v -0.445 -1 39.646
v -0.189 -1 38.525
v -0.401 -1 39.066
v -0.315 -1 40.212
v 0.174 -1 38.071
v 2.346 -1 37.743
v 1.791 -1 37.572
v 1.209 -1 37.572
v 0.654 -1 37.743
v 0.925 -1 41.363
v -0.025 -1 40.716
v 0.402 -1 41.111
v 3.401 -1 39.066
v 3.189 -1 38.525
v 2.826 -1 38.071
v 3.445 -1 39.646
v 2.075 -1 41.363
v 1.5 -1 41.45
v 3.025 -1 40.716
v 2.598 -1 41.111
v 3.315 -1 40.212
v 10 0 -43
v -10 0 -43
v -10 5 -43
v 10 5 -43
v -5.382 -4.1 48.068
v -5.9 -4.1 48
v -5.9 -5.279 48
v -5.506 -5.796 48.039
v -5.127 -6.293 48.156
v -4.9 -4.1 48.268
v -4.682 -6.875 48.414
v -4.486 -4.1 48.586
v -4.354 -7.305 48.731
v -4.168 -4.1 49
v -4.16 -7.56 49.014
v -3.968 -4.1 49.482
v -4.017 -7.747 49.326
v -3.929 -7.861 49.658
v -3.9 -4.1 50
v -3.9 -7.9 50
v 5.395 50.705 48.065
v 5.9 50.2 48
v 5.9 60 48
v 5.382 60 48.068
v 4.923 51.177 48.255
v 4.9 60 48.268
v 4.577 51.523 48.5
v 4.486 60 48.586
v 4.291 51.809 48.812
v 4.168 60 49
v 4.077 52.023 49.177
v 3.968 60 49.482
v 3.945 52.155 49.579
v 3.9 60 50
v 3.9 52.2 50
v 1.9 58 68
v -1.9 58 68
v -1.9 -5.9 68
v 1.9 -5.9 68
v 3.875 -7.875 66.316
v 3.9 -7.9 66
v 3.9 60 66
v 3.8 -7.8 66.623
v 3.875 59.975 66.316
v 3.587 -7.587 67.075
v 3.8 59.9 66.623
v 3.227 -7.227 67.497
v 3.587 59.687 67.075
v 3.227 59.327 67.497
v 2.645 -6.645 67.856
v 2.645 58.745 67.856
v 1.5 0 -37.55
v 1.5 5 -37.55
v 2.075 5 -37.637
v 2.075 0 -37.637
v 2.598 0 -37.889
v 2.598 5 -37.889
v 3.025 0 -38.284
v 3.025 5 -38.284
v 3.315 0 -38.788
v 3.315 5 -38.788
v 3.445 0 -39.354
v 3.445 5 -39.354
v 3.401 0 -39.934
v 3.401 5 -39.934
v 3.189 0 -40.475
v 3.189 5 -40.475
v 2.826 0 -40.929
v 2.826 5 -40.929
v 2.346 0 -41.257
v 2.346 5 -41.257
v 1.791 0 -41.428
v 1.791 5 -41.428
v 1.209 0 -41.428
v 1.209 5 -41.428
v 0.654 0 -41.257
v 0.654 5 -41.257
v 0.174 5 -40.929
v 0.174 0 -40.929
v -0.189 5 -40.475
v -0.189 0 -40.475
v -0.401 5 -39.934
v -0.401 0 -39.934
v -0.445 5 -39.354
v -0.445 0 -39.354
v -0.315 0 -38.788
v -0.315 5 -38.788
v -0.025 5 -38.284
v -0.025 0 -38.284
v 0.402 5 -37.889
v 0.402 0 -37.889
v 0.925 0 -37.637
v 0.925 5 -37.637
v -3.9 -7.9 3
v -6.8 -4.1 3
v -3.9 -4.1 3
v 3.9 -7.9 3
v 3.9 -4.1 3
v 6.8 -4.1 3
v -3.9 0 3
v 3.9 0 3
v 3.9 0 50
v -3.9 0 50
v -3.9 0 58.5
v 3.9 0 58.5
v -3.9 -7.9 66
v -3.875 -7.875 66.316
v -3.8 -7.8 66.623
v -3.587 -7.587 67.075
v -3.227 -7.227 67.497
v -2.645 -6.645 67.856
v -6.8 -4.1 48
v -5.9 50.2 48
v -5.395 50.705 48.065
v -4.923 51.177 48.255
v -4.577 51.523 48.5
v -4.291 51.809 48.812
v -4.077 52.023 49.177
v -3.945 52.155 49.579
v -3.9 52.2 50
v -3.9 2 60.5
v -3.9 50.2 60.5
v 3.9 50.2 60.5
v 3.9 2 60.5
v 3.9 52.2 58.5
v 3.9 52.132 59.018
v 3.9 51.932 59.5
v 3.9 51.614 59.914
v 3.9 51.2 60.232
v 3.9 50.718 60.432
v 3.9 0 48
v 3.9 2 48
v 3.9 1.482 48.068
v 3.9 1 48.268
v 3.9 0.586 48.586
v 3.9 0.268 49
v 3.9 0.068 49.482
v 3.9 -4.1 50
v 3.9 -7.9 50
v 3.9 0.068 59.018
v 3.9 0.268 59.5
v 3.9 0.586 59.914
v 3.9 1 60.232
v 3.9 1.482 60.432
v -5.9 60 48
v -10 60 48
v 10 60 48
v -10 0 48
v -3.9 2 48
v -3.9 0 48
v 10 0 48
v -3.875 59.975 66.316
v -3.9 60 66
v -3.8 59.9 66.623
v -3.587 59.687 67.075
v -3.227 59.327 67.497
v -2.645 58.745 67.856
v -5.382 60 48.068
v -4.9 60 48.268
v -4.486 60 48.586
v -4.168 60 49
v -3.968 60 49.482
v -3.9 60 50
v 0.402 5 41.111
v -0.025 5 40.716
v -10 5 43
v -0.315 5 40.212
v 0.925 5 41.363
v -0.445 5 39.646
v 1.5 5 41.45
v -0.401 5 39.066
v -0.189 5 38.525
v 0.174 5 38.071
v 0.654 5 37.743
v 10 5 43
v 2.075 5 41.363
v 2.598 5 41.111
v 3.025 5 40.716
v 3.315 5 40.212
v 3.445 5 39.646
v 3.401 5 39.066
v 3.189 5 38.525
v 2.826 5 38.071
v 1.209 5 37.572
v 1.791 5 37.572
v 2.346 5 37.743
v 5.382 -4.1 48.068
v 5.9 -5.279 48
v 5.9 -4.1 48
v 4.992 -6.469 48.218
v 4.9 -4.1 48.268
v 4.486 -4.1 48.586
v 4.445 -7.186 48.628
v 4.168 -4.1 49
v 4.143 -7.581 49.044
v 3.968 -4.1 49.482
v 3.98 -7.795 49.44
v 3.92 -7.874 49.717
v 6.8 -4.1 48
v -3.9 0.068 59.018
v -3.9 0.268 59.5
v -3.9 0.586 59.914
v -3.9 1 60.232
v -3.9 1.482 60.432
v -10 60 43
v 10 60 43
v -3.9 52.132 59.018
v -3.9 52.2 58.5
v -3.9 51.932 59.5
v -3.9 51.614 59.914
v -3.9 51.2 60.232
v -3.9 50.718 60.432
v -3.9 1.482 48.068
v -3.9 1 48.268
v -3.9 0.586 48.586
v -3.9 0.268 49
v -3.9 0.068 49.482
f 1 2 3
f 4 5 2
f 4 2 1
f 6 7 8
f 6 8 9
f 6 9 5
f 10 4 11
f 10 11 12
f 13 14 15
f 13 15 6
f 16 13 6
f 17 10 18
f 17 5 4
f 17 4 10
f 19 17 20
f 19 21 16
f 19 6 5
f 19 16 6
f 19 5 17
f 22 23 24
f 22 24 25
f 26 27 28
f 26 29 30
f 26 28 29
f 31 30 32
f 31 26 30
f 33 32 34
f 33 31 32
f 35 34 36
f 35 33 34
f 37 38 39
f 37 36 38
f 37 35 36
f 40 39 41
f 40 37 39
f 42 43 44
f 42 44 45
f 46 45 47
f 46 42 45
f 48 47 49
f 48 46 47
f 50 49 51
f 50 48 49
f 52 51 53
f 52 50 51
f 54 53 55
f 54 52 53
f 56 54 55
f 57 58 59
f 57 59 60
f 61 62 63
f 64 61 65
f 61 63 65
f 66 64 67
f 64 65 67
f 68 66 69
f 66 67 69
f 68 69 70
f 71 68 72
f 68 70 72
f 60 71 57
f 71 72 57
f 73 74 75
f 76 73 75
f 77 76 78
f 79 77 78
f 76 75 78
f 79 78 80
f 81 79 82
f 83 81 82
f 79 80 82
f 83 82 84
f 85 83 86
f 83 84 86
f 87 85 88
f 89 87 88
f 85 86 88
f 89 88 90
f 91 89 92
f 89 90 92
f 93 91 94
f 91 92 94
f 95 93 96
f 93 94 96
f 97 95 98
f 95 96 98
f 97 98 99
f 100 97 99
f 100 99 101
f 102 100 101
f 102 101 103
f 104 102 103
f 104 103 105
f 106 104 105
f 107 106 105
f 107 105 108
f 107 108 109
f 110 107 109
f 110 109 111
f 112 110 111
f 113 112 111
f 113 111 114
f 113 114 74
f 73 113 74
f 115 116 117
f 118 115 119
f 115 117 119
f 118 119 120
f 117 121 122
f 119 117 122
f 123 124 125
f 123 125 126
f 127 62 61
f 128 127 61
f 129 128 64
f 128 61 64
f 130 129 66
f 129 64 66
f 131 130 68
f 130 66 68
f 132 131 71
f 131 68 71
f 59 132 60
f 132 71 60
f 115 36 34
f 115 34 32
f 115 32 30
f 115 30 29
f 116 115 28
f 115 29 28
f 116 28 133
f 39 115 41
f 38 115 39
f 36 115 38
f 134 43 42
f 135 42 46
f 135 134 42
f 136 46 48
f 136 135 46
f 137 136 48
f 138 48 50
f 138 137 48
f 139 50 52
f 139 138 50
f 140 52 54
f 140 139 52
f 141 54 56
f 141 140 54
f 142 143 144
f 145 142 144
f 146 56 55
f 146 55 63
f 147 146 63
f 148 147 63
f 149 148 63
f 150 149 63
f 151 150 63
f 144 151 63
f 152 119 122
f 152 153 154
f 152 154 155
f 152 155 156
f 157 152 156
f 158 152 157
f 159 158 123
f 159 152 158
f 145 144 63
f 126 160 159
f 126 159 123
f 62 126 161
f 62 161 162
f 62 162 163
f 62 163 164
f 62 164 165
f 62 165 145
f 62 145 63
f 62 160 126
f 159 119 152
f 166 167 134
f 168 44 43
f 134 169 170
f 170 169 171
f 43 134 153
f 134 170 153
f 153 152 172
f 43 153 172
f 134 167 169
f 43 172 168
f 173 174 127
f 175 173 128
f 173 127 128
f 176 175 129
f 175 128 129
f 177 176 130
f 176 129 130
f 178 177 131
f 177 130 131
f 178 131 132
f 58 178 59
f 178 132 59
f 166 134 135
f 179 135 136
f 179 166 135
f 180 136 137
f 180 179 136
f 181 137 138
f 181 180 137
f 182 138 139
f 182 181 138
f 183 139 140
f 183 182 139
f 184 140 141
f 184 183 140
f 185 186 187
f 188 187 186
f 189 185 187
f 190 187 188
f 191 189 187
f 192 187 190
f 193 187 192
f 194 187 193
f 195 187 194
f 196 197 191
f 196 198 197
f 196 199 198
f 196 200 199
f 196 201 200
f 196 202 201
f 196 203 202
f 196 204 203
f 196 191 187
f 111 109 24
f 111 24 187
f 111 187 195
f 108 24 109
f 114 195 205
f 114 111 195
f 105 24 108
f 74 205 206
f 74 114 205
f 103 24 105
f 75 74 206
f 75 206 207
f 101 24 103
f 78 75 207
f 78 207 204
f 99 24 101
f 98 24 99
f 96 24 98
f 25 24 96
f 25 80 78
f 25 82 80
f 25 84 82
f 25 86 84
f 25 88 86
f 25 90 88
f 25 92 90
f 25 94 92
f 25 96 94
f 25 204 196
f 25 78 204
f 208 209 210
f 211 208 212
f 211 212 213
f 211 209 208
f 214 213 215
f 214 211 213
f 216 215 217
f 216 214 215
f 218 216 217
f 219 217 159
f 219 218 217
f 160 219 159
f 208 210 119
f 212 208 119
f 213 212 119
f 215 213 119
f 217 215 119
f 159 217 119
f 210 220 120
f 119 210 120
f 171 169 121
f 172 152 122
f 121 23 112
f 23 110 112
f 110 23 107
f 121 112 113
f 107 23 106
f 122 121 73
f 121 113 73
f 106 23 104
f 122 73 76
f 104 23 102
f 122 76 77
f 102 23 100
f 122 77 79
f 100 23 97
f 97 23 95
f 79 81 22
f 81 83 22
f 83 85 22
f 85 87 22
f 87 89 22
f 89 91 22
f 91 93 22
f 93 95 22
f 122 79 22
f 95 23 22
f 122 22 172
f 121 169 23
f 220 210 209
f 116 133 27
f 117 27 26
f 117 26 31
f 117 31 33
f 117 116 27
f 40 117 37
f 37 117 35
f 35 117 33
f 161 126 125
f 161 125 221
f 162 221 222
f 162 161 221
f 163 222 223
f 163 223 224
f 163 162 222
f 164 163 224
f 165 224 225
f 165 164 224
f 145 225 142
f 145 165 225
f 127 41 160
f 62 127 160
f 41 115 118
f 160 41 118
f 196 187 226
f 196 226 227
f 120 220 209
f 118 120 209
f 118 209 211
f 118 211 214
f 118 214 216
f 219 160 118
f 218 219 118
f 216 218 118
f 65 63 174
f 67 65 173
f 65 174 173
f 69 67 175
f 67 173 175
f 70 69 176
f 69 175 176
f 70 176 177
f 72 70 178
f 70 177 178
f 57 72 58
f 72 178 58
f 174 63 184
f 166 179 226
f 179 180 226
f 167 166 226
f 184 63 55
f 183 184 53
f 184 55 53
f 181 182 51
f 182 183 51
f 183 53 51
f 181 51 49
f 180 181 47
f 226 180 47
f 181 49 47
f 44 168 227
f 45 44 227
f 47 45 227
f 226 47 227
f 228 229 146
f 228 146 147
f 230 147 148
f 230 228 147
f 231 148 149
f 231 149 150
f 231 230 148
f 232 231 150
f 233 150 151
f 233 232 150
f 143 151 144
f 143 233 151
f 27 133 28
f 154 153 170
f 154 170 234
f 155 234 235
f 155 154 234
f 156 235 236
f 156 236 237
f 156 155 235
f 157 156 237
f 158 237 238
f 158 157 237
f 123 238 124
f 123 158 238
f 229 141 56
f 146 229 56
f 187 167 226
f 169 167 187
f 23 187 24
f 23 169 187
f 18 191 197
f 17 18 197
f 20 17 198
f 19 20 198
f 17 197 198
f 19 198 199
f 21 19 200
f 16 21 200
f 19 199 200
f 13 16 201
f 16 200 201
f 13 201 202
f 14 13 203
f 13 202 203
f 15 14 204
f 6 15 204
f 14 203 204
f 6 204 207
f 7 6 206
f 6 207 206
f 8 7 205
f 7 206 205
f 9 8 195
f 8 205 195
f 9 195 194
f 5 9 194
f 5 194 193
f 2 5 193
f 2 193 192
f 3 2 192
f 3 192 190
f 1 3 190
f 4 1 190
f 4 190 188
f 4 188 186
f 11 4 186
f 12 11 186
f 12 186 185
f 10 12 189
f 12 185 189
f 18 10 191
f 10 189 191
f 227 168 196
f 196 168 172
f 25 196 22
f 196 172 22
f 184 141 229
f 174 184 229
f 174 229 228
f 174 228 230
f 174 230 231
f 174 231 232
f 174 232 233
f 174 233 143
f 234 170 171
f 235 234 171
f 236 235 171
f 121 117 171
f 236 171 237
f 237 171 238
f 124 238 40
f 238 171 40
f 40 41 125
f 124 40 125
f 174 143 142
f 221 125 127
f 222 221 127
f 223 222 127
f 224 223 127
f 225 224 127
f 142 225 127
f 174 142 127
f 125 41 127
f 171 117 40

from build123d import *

# Parameters (mm, degrees)
SKETCH1_W           = 20
SKETCH1_H           = 86
BOSS_EXTRUDE1_DEPTH = 5
BOSS_EXTRUDE4_DEPTH = 40
SKETCH2_R           = 1.95
CUT_EXTRUDE1_DEPTH  = 6
BOSS_EXTRUDE5_DEPTH = 5
SKETCH5_W           = 20
SKETCH5_H           = 5
BOSS_EXTRUDE7_DEPTH = 60
SKETCH6_W           = 7.8
SKETCH6_H           = 7.9
SKETCH6_H_2         = 7.8
BOSS_EXTRUDE8_DEPTH = 12.5
SKETCH7_W           = 7.8
SKETCH7_H           = 67.9
BOSS_EXTRUDE9_DEPTH = 7.5
FILLET2_R           = 2


with BuildPart() as part:
    # Sketch1 → Boss-Extrude1 (new body)
    with BuildSketch(Plane(origin=(0, 0, 0), x_dir=(1, 0, 0), z_dir=(0, 1, 0))):
        Rectangle(SKETCH1_W, SKETCH1_H)
    extrude(amount=BOSS_EXTRUDE1_DEPTH)

    # Sketch4 → Boss-Extrude4 (add)
    with BuildSketch(Plane.XY.offset(43)):
        Polygon((-3.9, 0), (-3.9, -4.1), (-6.8, -4.1), (-3.9, -7.9), (3.9, -7.9), (6.8, -4.1), (3.9, -4.1), (3.9, 0), align=None)
    extrude(amount=-BOSS_EXTRUDE4_DEPTH)

    # Sketch2 → Cut-Extrude1 (cut)
    with BuildSketch(Plane(origin=(0, 5, 0), x_dir=(1, 0, 0), z_dir=(0, 1, 0))):
        with Locations(Location((1.5, -39.5, 0), (0, 0, 270))):
            Circle(SKETCH2_R)
        with Locations(Location((1.5, 39.5, 0), (0, 0, 270))):
            Circle(SKETCH2_R)
    extrude(amount=-CUT_EXTRUDE1_DEPTH, mode=Mode.SUBTRACT)

    # Sketch4<2> → Boss-Extrude5 (add)
    with BuildSketch(Plane.XY.offset(43)):
        Polygon((-3.9, 0), (-3.9, -4.1), (-6.8, -4.1), (-3.9, -7.9), (3.9, -7.9), (6.8, -4.1), (3.9, -4.1), (3.9, 0), align=None)
    extrude(amount=BOSS_EXTRUDE5_DEPTH)

    # Sketch5 → Boss-Extrude7 (add)
    with BuildSketch(Plane(origin=(0, 0, 0), x_dir=(1, 0, 0), z_dir=(0, 1, 0))):
        with Locations((0, -45.5)):
            Rectangle(SKETCH5_W, SKETCH5_H)
    extrude(amount=BOSS_EXTRUDE7_DEPTH)

    # Sketch6 → Boss-Extrude8 (add)
    with BuildSketch(Plane.XY.offset(48)):
        with Locations((0, -3.95)):
            Rectangle(SKETCH6_W, SKETCH6_H)
        with Locations((0, 56.1)):
            Rectangle(SKETCH6_W, SKETCH6_H_2)
    extrude(amount=BOSS_EXTRUDE8_DEPTH)

    # Sketch7 → Boss-Extrude9 (add)
    with BuildSketch(Plane.XY.offset(60.5)):
        with Locations((0, 26.05)):
            Rectangle(SKETCH7_W, SKETCH7_H)
    extrude(amount=BOSS_EXTRUDE9_DEPTH)

    # Fillet2
    # the kernel refuses this fillet: 2 mm, written as the material it adds along each edge
    with BuildSketch(Plane(origin=(3.9, -7.9, 48), x_dir=(0, 0, 1), z_dir=(0, 1, 0))) as fillet2_piece_1_section:
        with BuildLine():
            CenterArc((FILLET2_R, FILLET2_R), FILLET2_R, 180, 90)
            Line((0, FILLET2_R), (-FILLET2_R * 0.02, FILLET2_R))
            Line((-FILLET2_R * 0.02, FILLET2_R), (-FILLET2_R * 0.02, -FILLET2_R * 0.02))
            Line((-FILLET2_R * 0.02, -FILLET2_R * 0.02), (FILLET2_R, -FILLET2_R * 0.02))
            Line((FILLET2_R, -FILLET2_R * 0.02), (FILLET2_R, 0))
        make_face()
    fillet2_piece_1 = extrude(amount=3.8, mode=Mode.PRIVATE)
    fillet2_piece_1 = split(fillet2_piece_1, bisect_by=Plane(origin=(5.074861064, -6.360526881, 48.497353066), z_dir=(-0.7949512460450775, 0.6066733193501909, 0)), keep=Keep.TOP, mode=Mode.PRIVATE)
    add(fillet2_piece_1)
    with BuildSketch(Plane(origin=(3.9, 52.2, 48), x_dir=(0, 0, 1), z_dir=(0, 1, 0)), Plane(origin=(-3.9, 52.2, 60.5), x_dir=(0, -1, 0), z_dir=(1, 0, 0)), Plane(origin=(-3.9, 52.2, 48), x_dir=(0, 0, 1), z_dir=(1, 0, 0)), Plane(origin=(-3.9, 60, 48), x_dir=(0, 0, 1), z_dir=(0, -1, 0))) as fillet2_piece_2:
        with BuildLine():
            CenterArc((FILLET2_R, FILLET2_R), FILLET2_R, 180, 90)
            Line((0, FILLET2_R), (-FILLET2_R * 0.02, FILLET2_R))
            Line((-FILLET2_R * 0.02, FILLET2_R), (-FILLET2_R * 0.02, -FILLET2_R * 0.02))
            Line((-FILLET2_R * 0.02, -FILLET2_R * 0.02), (FILLET2_R, -FILLET2_R * 0.02))
            Line((FILLET2_R, -FILLET2_R * 0.02), (FILLET2_R, 0))
        make_face()
    extrude(amount=7.8)
    with BuildSketch(Plane(origin=(-3.9, -4.1, 48), x_dir=(-1, 0, 0), z_dir=(0, -1, 0))) as fillet2_piece_3_section:
        with BuildLine():
            CenterArc((FILLET2_R, -FILLET2_R), FILLET2_R, 90, 90)
            Line((0, -FILLET2_R), (-FILLET2_R * 0.02, -FILLET2_R))
            Line((-FILLET2_R * 0.02, -FILLET2_R), (-FILLET2_R * 0.02, FILLET2_R * 0.02))
            Line((-FILLET2_R * 0.02, FILLET2_R * 0.02), (FILLET2_R, FILLET2_R * 0.02))
            Line((FILLET2_R, FILLET2_R * 0.02), (FILLET2_R, 0))
        make_face()
    fillet2_piece_3 = extrude(amount=3.8, mode=Mode.PRIVATE)
    fillet2_piece_3 = split(fillet2_piece_3, bisect_by=Plane(origin=(-5.074861064, -6.360526881, 48.497353066), z_dir=(0.7949512460450775, 0.6066733193501909, 0)), keep=Keep.TOP, mode=Mode.PRIVATE)
    add(fillet2_piece_3)
    with BuildSketch(Plane(origin=(3.9, 0, 48), x_dir=(0, 0, 1), z_dir=(-1, 0, 0))) as fillet2_piece_4_section:
        with BuildLine():
            CenterArc((FILLET2_R, FILLET2_R), FILLET2_R, 180, 90)
            Line((0, FILLET2_R), (-FILLET2_R * 0.02, FILLET2_R))
            Line((-FILLET2_R * 0.02, FILLET2_R), (-FILLET2_R * 0.02, -FILLET2_R * 0.02))
            Line((-FILLET2_R * 0.02, -FILLET2_R * 0.02), (FILLET2_R, -FILLET2_R * 0.02))
            Line((FILLET2_R, -FILLET2_R * 0.02), (FILLET2_R, 0))
        make_face()
    fillet2_piece_4 = extrude(amount=7.8, mode=Mode.PRIVATE)
    fillet2_piece_4 = split(fillet2_piece_4, bisect_by=Plane(origin=(0, 0, 48.406946259), z_dir=(0, 1, 0)), keep=Keep.TOP, mode=Mode.PRIVATE)
    add(fillet2_piece_4)
    with BuildSketch(Plane(origin=(3.9, 0, 60.5), x_dir=(0, 0, -1), z_dir=(-1, 0, 0))) as fillet2_piece_5:
        with BuildLine():
            CenterArc((FILLET2_R, -FILLET2_R), FILLET2_R, 90, 90)
            Line((0, -FILLET2_R), (-FILLET2_R * 0.02, -FILLET2_R))
            Line((-FILLET2_R * 0.02, -FILLET2_R), (-FILLET2_R * 0.02, FILLET2_R * 0.02))
            Line((-FILLET2_R * 0.02, FILLET2_R * 0.02), (FILLET2_R, FILLET2_R * 0.02))
            Line((FILLET2_R, FILLET2_R * 0.02), (FILLET2_R, 0))
        make_face()
    extrude(amount=7.8)
    with BuildSketch(Plane(origin=(3.9, 47.2, 48), x_dir=(0, 0, 1), z_dir=(0, 1, 0))) as fillet2_piece_6a_section:
        with BuildLine():
            CenterArc((FILLET2_R, FILLET2_R), FILLET2_R, 180, 90)
            Line((0, FILLET2_R), (-FILLET2_R * 0.02, FILLET2_R))
            Line((-FILLET2_R * 0.02, FILLET2_R), (-FILLET2_R * 0.02, -FILLET2_R * 0.02))
            Line((-FILLET2_R * 0.02, -FILLET2_R * 0.02), (FILLET2_R, -FILLET2_R * 0.02))
            Line((FILLET2_R, -FILLET2_R * 0.02), (FILLET2_R, 0))
        make_face()
    fillet2_piece_6a = extrude(amount=12.8, mode=Mode.PRIVATE)
    fillet2_piece_6a = split(fillet2_piece_6a, bisect_by=Plane(origin=(4.352790229, 52.2, 48.452790229), z_dir=(0, -1, 0)), keep=Keep.TOP, mode=Mode.PRIVATE)
    with BuildSketch(Plane(origin=(-3.9, 52.2, 48), x_dir=(0, 0, 1), z_dir=(1, 0, 0))) as fillet2_piece_6b_section:
        with BuildLine():
            CenterArc((FILLET2_R, FILLET2_R), FILLET2_R, 180, 90)
            Line((0, FILLET2_R), (-FILLET2_R * 0.02, FILLET2_R))
            Line((-FILLET2_R * 0.02, FILLET2_R), (-FILLET2_R * 0.02, -FILLET2_R * 0.02))
            Line((-FILLET2_R * 0.02, -FILLET2_R * 0.02), (FILLET2_R, -FILLET2_R * 0.02))
            Line((FILLET2_R, -FILLET2_R * 0.02), (FILLET2_R, 0))
        make_face()
    fillet2_piece_6b = extrude(amount=12.8, mode=Mode.PRIVATE)
    fillet2_piece_6b = split(fillet2_piece_6b, bisect_by=Plane(origin=(3.9, 51.747209771, 48.452790229), z_dir=(1, 0, 0)), keep=Keep.TOP, mode=Mode.PRIVATE)
    fillet2_piece_6 = fillet2_piece_6a & fillet2_piece_6b
    add(fillet2_piece_6)
    with BuildSketch(Plane(origin=(-8.9, 52.2, 48), x_dir=(0, 0, 1), z_dir=(1, 0, 0))) as fillet2_piece_7a_section:
        with BuildLine():
            CenterArc((FILLET2_R, FILLET2_R), FILLET2_R, 180, 90)
            Line((0, FILLET2_R), (-FILLET2_R * 0.02, FILLET2_R))
            Line((-FILLET2_R * 0.02, FILLET2_R), (-FILLET2_R * 0.02, -FILLET2_R * 0.02))
            Line((-FILLET2_R * 0.02, -FILLET2_R * 0.02), (FILLET2_R, -FILLET2_R * 0.02))
            Line((FILLET2_R, -FILLET2_R * 0.02), (FILLET2_R, 0))
        make_face()
    fillet2_piece_7a = extrude(amount=12.8, mode=Mode.PRIVATE)
    fillet2_piece_7a = split(fillet2_piece_7a, bisect_by=Plane(origin=(-3.9, 51.747209771, 48.452790229), z_dir=(-1, 0, 0)), keep=Keep.TOP, mode=Mode.PRIVATE)
    with BuildSketch(Plane(origin=(-3.9, 60, 48), x_dir=(0, 0, 1), z_dir=(0, -1, 0))) as fillet2_piece_7b_section:
        with BuildLine():
            CenterArc((FILLET2_R, FILLET2_R), FILLET2_R, 180, 90)
            Line((0, FILLET2_R), (-FILLET2_R * 0.02, FILLET2_R))
            Line((-FILLET2_R * 0.02, FILLET2_R), (-FILLET2_R * 0.02, -FILLET2_R * 0.02))
            Line((-FILLET2_R * 0.02, -FILLET2_R * 0.02), (FILLET2_R, -FILLET2_R * 0.02))
            Line((FILLET2_R, -FILLET2_R * 0.02), (FILLET2_R, 0))
        make_face()
    fillet2_piece_7b = extrude(amount=12.8, mode=Mode.PRIVATE)
    fillet2_piece_7b = split(fillet2_piece_7b, bisect_by=Plane(origin=(-4.352790229, 52.2, 48.452790229), z_dir=(0, -1, 0)), keep=Keep.TOP, mode=Mode.PRIVATE)
    fillet2_piece_7 = fillet2_piece_7a & fillet2_piece_7b
    add(fillet2_piece_7)
    # the kernel refuses this fillet: 2 mm, written as the material it takes off along each edge
    with BuildSketch(Plane(origin=(3.9, 60, 68), x_dir=(0, 0, -1), z_dir=(0, -1, 0))) as fillet2_2_piece_1:
        with BuildLine():
            CenterArc((FILLET2_R, -FILLET2_R), FILLET2_R, 90, 90)
            Line((0, -FILLET2_R), (-FILLET2_R * 0.02, -FILLET2_R))
            Line((-FILLET2_R * 0.02, -FILLET2_R), (-FILLET2_R * 0.02, FILLET2_R * 0.02))
            Line((-FILLET2_R * 0.02, FILLET2_R * 0.02), (FILLET2_R, FILLET2_R * 0.02))
            Line((FILLET2_R, FILLET2_R * 0.02), (FILLET2_R, 0))
        make_face()
    extrude(amount=67.9, mode=Mode.SUBTRACT)
    with BuildSketch(Plane(origin=(-3.9, 60, 68), x_dir=(0, -1, 0), z_dir=(1, 0, 0)), Plane(origin=(3.9, -7.9, 68), x_dir=(0, 1, 0), z_dir=(-1, 0, 0))) as fillet2_2_piece_2:
        with BuildLine():
            CenterArc((FILLET2_R, FILLET2_R), FILLET2_R, 180, 90)
            Line((0, FILLET2_R), (-FILLET2_R * 0.02, FILLET2_R))
            Line((-FILLET2_R * 0.02, FILLET2_R), (-FILLET2_R * 0.02, -FILLET2_R * 0.02))
            Line((-FILLET2_R * 0.02, -FILLET2_R * 0.02), (FILLET2_R, -FILLET2_R * 0.02))
            Line((FILLET2_R, -FILLET2_R * 0.02), (FILLET2_R, 0))
        make_face()
    extrude(amount=7.8, mode=Mode.SUBTRACT)
    with BuildSketch(Plane(origin=(-3.9, -7.9, 68), x_dir=(1, 0, 0), z_dir=(0, 1, 0))) as fillet2_2_piece_3:
        with BuildLine():
            CenterArc((FILLET2_R, FILLET2_R), FILLET2_R, 180, 90)
            Line((0, FILLET2_R), (-FILLET2_R * 0.02, FILLET2_R))
            Line((-FILLET2_R * 0.02, FILLET2_R), (-FILLET2_R * 0.02, -FILLET2_R * 0.02))
            Line((-FILLET2_R * 0.02, -FILLET2_R * 0.02), (FILLET2_R, -FILLET2_R * 0.02))
            Line((FILLET2_R, -FILLET2_R * 0.02), (FILLET2_R, 0))
        make_face()
    extrude(amount=67.9, mode=Mode.SUBTRACT)
    with BuildSketch(Plane(origin=(3.9, 65, 68), x_dir=(0, 0, -1), z_dir=(0, -1, 0))) as fillet2_2_piece_4a_section:
        with BuildLine():
            CenterArc((FILLET2_R, -FILLET2_R), FILLET2_R, 90, 90)
            Line((0, -FILLET2_R), (-FILLET2_R * 0.02, -FILLET2_R))
            Line((-FILLET2_R * 0.02, -FILLET2_R), (-FILLET2_R * 0.02, FILLET2_R * 0.02))
            Line((-FILLET2_R * 0.02, FILLET2_R * 0.02), (FILLET2_R, FILLET2_R * 0.02))
            Line((FILLET2_R, FILLET2_R * 0.02), (FILLET2_R, 0))
        make_face()
    fillet2_2_piece_4a = extrude(amount=72.9, mode=Mode.PRIVATE)
    fillet2_2_piece_4a = split(fillet2_2_piece_4a, bisect_by=Plane(origin=(3.447209771, 60, 67.547209771), z_dir=(0, 1, 0)), keep=Keep.TOP, mode=Mode.PRIVATE)
    with BuildSketch(Plane(origin=(-3.9, 60, 68), x_dir=(0, -1, 0), z_dir=(1, 0, 0))) as fillet2_2_piece_4b_section:
        with BuildLine():
            CenterArc((FILLET2_R, FILLET2_R), FILLET2_R, 180, 90)
            Line((0, FILLET2_R), (-FILLET2_R * 0.02, FILLET2_R))
            Line((-FILLET2_R * 0.02, FILLET2_R), (-FILLET2_R * 0.02, -FILLET2_R * 0.02))
            Line((-FILLET2_R * 0.02, -FILLET2_R * 0.02), (FILLET2_R, -FILLET2_R * 0.02))
            Line((FILLET2_R, -FILLET2_R * 0.02), (FILLET2_R, 0))
        make_face()
    fillet2_2_piece_4b = extrude(amount=12.8, mode=Mode.PRIVATE)
    fillet2_2_piece_4b = split(fillet2_2_piece_4b, bisect_by=Plane(origin=(3.9, 59.547209771, 67.547209771), z_dir=(1, 0, 0)), keep=Keep.TOP, mode=Mode.PRIVATE)
    fillet2_2_piece_4 = fillet2_2_piece_4a & fillet2_2_piece_4b
    add(fillet2_2_piece_4, mode=Mode.SUBTRACT)
    with BuildSketch(Plane(origin=(3.9, 60, 68), x_dir=(0, 0, -1), z_dir=(0, -1, 0))) as fillet2_2_piece_5a_section:
        with BuildLine():
            CenterArc((FILLET2_R, -FILLET2_R), FILLET2_R, 90, 90)
            Line((0, -FILLET2_R), (-FILLET2_R * 0.02, -FILLET2_R))
            Line((-FILLET2_R * 0.02, -FILLET2_R), (-FILLET2_R * 0.02, FILLET2_R * 0.02))
            Line((-FILLET2_R * 0.02, FILLET2_R * 0.02), (FILLET2_R, FILLET2_R * 0.02))
            Line((FILLET2_R, FILLET2_R * 0.02), (FILLET2_R, 0))
        make_face()
    fillet2_2_piece_5a = extrude(amount=72.9, mode=Mode.PRIVATE)
    fillet2_2_piece_5a = split(fillet2_2_piece_5a, bisect_by=Plane(origin=(3.447209771, -7.9, 67.547209771), z_dir=(0, -1, 0)), keep=Keep.TOP, mode=Mode.PRIVATE)
    with BuildSketch(Plane(origin=(8.9, -7.9, 68), x_dir=(0, 1, 0), z_dir=(-1, 0, 0))) as fillet2_2_piece_5b_section:
        with BuildLine():
            CenterArc((FILLET2_R, FILLET2_R), FILLET2_R, 180, 90)
            Line((0, FILLET2_R), (-FILLET2_R * 0.02, FILLET2_R))
            Line((-FILLET2_R * 0.02, FILLET2_R), (-FILLET2_R * 0.02, -FILLET2_R * 0.02))
            Line((-FILLET2_R * 0.02, -FILLET2_R * 0.02), (FILLET2_R, -FILLET2_R * 0.02))
            Line((FILLET2_R, -FILLET2_R * 0.02), (FILLET2_R, 0))
        make_face()
    fillet2_2_piece_5b = extrude(amount=12.8, mode=Mode.PRIVATE)
    fillet2_2_piece_5b = split(fillet2_2_piece_5b, bisect_by=Plane(origin=(3.9, -7.447209771, 67.547209771), z_dir=(1, 0, 0)), keep=Keep.TOP, mode=Mode.PRIVATE)
    fillet2_2_piece_5 = fillet2_2_piece_5a & fillet2_2_piece_5b
    add(fillet2_2_piece_5, mode=Mode.SUBTRACT)
    with BuildSketch(Plane(origin=(-8.9, 60, 68), x_dir=(0, -1, 0), z_dir=(1, 0, 0))) as fillet2_2_piece_6a_section:
        with BuildLine():
            CenterArc((FILLET2_R, FILLET2_R), FILLET2_R, 180, 90)
            Line((0, FILLET2_R), (-FILLET2_R * 0.02, FILLET2_R))
            Line((-FILLET2_R * 0.02, FILLET2_R), (-FILLET2_R * 0.02, -FILLET2_R * 0.02))
            Line((-FILLET2_R * 0.02, -FILLET2_R * 0.02), (FILLET2_R, -FILLET2_R * 0.02))
            Line((FILLET2_R, -FILLET2_R * 0.02), (FILLET2_R, 0))
        make_face()
    fillet2_2_piece_6a = extrude(amount=12.8, mode=Mode.PRIVATE)
    fillet2_2_piece_6a = split(fillet2_2_piece_6a, bisect_by=Plane(origin=(-3.9, 59.547209771, 67.547209771), z_dir=(-1, 0, 0)), keep=Keep.TOP, mode=Mode.PRIVATE)
    with BuildSketch(Plane(origin=(-3.9, -7.9, 68), x_dir=(1, 0, 0), z_dir=(0, 1, 0))) as fillet2_2_piece_6b_section:
        with BuildLine():
            CenterArc((FILLET2_R, FILLET2_R), FILLET2_R, 180, 90)
            Line((0, FILLET2_R), (-FILLET2_R * 0.02, FILLET2_R))
            Line((-FILLET2_R * 0.02, FILLET2_R), (-FILLET2_R * 0.02, -FILLET2_R * 0.02))
            Line((-FILLET2_R * 0.02, -FILLET2_R * 0.02), (FILLET2_R, -FILLET2_R * 0.02))
            Line((FILLET2_R, -FILLET2_R * 0.02), (FILLET2_R, 0))
        make_face()
    fillet2_2_piece_6b = extrude(amount=72.9, mode=Mode.PRIVATE)
    fillet2_2_piece_6b = split(fillet2_2_piece_6b, bisect_by=Plane(origin=(-3.447209771, 60, 67.547209771), z_dir=(0, 1, 0)), keep=Keep.TOP, mode=Mode.PRIVATE)
    fillet2_2_piece_6 = fillet2_2_piece_6a & fillet2_2_piece_6b
    add(fillet2_2_piece_6, mode=Mode.SUBTRACT)
    with BuildSketch(Plane(origin=(3.9, -7.9, 68), x_dir=(0, 1, 0), z_dir=(-1, 0, 0))) as fillet2_2_piece_7a_section:
        with BuildLine():
            CenterArc((FILLET2_R, FILLET2_R), FILLET2_R, 180, 90)
            Line((0, FILLET2_R), (-FILLET2_R * 0.02, FILLET2_R))
            Line((-FILLET2_R * 0.02, FILLET2_R), (-FILLET2_R * 0.02, -FILLET2_R * 0.02))
            Line((-FILLET2_R * 0.02, -FILLET2_R * 0.02), (FILLET2_R, -FILLET2_R * 0.02))
            Line((FILLET2_R, -FILLET2_R * 0.02), (FILLET2_R, 0))
        make_face()
    fillet2_2_piece_7a = extrude(amount=12.8, mode=Mode.PRIVATE)
    fillet2_2_piece_7a = split(fillet2_2_piece_7a, bisect_by=Plane(origin=(-3.9, -7.447209771, 67.547209771), z_dir=(-1, 0, 0)), keep=Keep.TOP, mode=Mode.PRIVATE)
    with BuildSketch(Plane(origin=(-3.9, -12.9, 68), x_dir=(1, 0, 0), z_dir=(0, 1, 0))) as fillet2_2_piece_7b_section:
        with BuildLine():
            CenterArc((FILLET2_R, FILLET2_R), FILLET2_R, 180, 90)
            Line((0, FILLET2_R), (-FILLET2_R * 0.02, FILLET2_R))
            Line((-FILLET2_R * 0.02, FILLET2_R), (-FILLET2_R * 0.02, -FILLET2_R * 0.02))
            Line((-FILLET2_R * 0.02, -FILLET2_R * 0.02), (FILLET2_R, -FILLET2_R * 0.02))
            Line((FILLET2_R, -FILLET2_R * 0.02), (FILLET2_R, 0))
        make_face()
    fillet2_2_piece_7b = extrude(amount=72.9, mode=Mode.PRIVATE)
    fillet2_2_piece_7b = split(fillet2_2_piece_7b, bisect_by=Plane(origin=(-3.447209771, -7.9, 67.547209771), z_dir=(0, -1, 0)), keep=Keep.TOP, mode=Mode.PRIVATE)
    fillet2_2_piece_7 = fillet2_2_piece_7a & fillet2_2_piece_7b
    add(fillet2_2_piece_7, mode=Mode.SUBTRACT)


solid = part.part
